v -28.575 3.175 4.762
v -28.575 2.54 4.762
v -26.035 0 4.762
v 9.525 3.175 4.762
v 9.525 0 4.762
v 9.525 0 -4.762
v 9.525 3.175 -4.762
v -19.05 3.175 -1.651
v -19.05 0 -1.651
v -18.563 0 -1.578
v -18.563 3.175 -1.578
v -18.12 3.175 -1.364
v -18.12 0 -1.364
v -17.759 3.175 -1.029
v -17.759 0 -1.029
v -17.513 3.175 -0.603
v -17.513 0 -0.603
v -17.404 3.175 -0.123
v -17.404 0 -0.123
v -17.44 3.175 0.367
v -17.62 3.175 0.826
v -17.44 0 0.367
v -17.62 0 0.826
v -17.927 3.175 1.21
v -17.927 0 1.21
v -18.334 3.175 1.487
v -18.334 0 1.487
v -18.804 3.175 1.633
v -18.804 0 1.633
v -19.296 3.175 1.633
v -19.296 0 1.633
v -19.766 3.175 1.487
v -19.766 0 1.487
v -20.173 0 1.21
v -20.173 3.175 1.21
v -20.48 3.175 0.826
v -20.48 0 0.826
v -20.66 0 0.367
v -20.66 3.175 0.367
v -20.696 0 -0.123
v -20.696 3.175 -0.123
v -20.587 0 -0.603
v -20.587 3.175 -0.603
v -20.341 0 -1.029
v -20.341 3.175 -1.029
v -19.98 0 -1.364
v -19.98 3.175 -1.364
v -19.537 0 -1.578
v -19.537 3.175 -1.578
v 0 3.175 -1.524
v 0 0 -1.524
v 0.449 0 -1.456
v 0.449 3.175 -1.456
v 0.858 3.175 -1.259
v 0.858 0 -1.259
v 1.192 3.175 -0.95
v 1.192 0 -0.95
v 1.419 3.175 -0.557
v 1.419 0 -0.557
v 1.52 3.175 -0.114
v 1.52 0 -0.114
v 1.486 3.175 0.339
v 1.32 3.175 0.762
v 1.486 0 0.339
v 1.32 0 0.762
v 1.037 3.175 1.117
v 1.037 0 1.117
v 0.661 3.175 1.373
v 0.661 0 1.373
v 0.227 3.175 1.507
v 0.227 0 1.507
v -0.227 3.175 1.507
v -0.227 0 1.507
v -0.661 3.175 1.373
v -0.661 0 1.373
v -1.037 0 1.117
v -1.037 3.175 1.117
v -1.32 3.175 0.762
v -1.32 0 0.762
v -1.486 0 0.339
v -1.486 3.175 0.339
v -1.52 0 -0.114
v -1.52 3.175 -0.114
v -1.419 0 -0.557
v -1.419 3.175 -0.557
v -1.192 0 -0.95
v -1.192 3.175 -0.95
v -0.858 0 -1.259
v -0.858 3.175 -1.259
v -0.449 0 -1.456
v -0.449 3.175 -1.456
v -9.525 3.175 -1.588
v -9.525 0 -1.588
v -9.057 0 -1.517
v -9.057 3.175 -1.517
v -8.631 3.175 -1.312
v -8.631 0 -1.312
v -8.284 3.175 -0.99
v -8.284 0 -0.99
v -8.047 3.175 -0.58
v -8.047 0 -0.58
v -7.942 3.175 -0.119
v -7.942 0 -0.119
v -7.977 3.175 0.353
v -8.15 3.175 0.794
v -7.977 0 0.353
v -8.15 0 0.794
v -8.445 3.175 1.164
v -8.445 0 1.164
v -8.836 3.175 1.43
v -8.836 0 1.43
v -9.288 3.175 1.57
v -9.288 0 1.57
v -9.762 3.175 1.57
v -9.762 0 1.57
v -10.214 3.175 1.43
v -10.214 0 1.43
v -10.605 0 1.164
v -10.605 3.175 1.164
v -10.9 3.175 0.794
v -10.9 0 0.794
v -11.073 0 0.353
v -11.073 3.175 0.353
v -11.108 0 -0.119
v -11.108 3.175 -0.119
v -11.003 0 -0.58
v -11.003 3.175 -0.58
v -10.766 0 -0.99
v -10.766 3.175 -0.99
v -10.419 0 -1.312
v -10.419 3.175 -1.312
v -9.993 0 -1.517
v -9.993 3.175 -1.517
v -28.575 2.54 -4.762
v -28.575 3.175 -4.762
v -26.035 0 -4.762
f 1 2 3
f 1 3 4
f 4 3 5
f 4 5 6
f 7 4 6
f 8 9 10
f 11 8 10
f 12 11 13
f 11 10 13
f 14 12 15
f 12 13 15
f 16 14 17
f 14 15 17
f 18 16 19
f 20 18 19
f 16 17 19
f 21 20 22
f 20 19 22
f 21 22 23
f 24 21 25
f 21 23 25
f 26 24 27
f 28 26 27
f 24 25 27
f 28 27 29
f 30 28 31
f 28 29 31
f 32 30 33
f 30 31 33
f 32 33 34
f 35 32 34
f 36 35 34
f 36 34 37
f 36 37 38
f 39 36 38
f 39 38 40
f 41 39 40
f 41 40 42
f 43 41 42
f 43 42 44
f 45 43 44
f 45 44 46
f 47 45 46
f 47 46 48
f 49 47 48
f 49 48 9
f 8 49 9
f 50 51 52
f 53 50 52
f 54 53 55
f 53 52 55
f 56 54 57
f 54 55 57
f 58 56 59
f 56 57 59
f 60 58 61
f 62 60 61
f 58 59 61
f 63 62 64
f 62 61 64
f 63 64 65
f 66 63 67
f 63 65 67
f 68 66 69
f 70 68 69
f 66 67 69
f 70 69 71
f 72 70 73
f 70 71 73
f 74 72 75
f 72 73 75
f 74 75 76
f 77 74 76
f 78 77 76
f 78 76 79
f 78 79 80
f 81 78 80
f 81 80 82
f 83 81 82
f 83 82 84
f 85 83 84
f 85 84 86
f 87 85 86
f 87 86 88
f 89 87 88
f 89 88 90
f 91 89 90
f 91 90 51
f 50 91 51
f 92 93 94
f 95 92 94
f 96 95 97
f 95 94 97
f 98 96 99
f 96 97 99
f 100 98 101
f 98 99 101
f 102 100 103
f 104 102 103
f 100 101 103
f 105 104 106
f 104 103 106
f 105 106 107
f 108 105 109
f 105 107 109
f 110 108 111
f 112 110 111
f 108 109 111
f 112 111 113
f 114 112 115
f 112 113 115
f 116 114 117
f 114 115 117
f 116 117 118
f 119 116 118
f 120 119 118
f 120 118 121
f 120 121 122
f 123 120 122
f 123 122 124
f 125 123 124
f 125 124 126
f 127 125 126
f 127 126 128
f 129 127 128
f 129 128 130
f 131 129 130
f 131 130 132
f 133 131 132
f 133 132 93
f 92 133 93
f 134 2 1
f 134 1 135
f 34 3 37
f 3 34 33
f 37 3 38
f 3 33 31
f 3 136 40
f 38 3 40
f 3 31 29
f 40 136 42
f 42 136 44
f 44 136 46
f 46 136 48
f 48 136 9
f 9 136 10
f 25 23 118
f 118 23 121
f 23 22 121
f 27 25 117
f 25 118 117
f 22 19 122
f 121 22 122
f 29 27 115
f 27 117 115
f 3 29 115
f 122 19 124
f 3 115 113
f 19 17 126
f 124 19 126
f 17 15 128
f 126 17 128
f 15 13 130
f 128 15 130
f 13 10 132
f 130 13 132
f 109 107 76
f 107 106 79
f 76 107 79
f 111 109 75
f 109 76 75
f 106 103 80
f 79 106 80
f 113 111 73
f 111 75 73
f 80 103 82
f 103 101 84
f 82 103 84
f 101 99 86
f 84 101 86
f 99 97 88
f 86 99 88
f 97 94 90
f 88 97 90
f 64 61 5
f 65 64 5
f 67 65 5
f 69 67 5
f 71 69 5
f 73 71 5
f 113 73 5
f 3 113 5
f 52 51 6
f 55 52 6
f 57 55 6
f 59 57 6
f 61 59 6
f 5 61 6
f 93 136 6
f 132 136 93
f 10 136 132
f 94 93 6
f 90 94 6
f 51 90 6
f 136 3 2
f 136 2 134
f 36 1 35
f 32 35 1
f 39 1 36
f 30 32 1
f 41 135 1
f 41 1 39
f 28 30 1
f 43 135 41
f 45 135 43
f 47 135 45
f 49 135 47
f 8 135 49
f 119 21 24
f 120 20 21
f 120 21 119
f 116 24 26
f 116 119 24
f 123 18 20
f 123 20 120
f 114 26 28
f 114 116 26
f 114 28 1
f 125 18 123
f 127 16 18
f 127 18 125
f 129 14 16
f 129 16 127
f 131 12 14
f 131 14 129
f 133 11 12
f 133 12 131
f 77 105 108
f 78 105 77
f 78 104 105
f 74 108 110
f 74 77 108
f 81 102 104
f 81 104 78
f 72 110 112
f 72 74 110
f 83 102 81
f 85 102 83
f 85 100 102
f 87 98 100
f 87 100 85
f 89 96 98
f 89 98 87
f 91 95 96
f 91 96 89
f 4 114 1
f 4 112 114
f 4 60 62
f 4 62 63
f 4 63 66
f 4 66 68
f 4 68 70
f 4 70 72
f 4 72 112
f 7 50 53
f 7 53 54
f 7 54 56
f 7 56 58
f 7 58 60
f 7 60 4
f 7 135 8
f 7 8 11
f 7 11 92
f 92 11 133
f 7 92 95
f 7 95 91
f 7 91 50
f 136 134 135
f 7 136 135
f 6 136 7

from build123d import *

# Parameters (mm, degrees)
SKETCH1_W           = 38.1
SKETCH1_H           = 9.525
BOSS_EXTRUDE1_DEPTH = 3.175
SKETCH2_R           = 1.651
SKETCH2_R_2         = 1.5875
SKETCH2_R_3         = 1.524
CUT_EXTRUDE1_DEPTH  = 30.142626104
CHAMFER1_SIZE       = 2.54


with BuildPart() as part:
    # Sketch1 → Boss-Extrude1 (new body)
    with BuildSketch(Plane(origin=(0, 0, 0), x_dir=(1, 0, 0), z_dir=(0, 1, 0))):
        with Locations((-9.525, 0)):
            Rectangle(SKETCH1_W, SKETCH1_H)
    extrude(amount=BOSS_EXTRUDE1_DEPTH)

    # Sketch2 → Cut-Extrude1 (cut, through all)
    with BuildSketch(Plane.XZ):
        with Locations(Location((-19.05, 0, 0), (0, 0, 270))):
            Circle(SKETCH2_R)
        with Locations(Location((-9.525, 0, 0), (0, 0, 270))):
            Circle(SKETCH2_R_2)
        with Locations(Location((0, 0, 0), (0, 0, 270))):
            Circle(SKETCH2_R_3)
    extrude(amount=-CUT_EXTRUDE1_DEPTH, mode=Mode.SUBTRACT)

    # Chamfer1
    chamfer1_edges = [part.edges().sort_by_distance(p)[0] for p in [
        (-28.575, 0, 0),
    ]]
    chamfer(chamfer1_edges, length=CHAMFER1_SIZE)


solid = part.part
